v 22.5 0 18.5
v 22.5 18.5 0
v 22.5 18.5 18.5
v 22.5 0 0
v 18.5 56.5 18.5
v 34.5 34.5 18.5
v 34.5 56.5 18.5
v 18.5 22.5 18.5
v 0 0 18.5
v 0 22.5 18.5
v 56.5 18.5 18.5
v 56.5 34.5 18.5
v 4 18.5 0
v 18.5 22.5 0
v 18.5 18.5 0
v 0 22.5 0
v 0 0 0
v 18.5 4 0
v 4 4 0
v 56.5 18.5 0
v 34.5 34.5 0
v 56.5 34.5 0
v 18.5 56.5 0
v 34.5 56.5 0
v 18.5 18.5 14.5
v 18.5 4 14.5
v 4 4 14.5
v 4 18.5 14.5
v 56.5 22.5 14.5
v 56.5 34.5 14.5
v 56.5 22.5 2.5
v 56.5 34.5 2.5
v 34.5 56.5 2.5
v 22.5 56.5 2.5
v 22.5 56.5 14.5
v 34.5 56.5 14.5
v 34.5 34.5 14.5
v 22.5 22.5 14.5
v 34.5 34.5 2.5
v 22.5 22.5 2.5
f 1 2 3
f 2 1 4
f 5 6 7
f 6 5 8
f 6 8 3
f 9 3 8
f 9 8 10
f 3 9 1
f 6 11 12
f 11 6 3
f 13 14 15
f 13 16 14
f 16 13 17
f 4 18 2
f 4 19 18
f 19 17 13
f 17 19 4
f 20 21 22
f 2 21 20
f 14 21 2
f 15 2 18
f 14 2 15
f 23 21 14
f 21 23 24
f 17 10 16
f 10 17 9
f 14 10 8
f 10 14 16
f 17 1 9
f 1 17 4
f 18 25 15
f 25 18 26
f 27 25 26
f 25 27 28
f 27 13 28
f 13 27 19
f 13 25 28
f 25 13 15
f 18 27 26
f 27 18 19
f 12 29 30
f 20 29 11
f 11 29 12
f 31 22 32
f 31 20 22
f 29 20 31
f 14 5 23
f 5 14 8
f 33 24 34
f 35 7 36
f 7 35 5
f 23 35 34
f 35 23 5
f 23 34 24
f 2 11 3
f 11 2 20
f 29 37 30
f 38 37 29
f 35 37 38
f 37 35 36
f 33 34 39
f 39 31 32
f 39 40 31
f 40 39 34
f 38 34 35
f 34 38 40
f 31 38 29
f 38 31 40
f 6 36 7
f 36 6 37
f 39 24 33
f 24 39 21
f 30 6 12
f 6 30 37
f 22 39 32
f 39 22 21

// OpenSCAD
mirror_t = 12;
mirror_s = 30;
cube_s = 14.5;

t = 4;

difference(){
	cube([cube_s+2*t,cube_s+2*t,cube_s+t]);
	translate([t,t,0])
	cube([cube_s,cube_s,cube_s]);
}

translate([cube_s+t,cube_s+t,0])
difference(){
	cube([mirror_s+2*t,mirror_s+2*t,cube_s+t]);
	translate([t,t,cube_s-mirror_t])
	cube([mirror_s+t,mirror_s+t,mirror_t]);
	translate([4*t,4*t,0])
	cube([mirror_s-t,mirror_s-t,cube_s+t]);
}
